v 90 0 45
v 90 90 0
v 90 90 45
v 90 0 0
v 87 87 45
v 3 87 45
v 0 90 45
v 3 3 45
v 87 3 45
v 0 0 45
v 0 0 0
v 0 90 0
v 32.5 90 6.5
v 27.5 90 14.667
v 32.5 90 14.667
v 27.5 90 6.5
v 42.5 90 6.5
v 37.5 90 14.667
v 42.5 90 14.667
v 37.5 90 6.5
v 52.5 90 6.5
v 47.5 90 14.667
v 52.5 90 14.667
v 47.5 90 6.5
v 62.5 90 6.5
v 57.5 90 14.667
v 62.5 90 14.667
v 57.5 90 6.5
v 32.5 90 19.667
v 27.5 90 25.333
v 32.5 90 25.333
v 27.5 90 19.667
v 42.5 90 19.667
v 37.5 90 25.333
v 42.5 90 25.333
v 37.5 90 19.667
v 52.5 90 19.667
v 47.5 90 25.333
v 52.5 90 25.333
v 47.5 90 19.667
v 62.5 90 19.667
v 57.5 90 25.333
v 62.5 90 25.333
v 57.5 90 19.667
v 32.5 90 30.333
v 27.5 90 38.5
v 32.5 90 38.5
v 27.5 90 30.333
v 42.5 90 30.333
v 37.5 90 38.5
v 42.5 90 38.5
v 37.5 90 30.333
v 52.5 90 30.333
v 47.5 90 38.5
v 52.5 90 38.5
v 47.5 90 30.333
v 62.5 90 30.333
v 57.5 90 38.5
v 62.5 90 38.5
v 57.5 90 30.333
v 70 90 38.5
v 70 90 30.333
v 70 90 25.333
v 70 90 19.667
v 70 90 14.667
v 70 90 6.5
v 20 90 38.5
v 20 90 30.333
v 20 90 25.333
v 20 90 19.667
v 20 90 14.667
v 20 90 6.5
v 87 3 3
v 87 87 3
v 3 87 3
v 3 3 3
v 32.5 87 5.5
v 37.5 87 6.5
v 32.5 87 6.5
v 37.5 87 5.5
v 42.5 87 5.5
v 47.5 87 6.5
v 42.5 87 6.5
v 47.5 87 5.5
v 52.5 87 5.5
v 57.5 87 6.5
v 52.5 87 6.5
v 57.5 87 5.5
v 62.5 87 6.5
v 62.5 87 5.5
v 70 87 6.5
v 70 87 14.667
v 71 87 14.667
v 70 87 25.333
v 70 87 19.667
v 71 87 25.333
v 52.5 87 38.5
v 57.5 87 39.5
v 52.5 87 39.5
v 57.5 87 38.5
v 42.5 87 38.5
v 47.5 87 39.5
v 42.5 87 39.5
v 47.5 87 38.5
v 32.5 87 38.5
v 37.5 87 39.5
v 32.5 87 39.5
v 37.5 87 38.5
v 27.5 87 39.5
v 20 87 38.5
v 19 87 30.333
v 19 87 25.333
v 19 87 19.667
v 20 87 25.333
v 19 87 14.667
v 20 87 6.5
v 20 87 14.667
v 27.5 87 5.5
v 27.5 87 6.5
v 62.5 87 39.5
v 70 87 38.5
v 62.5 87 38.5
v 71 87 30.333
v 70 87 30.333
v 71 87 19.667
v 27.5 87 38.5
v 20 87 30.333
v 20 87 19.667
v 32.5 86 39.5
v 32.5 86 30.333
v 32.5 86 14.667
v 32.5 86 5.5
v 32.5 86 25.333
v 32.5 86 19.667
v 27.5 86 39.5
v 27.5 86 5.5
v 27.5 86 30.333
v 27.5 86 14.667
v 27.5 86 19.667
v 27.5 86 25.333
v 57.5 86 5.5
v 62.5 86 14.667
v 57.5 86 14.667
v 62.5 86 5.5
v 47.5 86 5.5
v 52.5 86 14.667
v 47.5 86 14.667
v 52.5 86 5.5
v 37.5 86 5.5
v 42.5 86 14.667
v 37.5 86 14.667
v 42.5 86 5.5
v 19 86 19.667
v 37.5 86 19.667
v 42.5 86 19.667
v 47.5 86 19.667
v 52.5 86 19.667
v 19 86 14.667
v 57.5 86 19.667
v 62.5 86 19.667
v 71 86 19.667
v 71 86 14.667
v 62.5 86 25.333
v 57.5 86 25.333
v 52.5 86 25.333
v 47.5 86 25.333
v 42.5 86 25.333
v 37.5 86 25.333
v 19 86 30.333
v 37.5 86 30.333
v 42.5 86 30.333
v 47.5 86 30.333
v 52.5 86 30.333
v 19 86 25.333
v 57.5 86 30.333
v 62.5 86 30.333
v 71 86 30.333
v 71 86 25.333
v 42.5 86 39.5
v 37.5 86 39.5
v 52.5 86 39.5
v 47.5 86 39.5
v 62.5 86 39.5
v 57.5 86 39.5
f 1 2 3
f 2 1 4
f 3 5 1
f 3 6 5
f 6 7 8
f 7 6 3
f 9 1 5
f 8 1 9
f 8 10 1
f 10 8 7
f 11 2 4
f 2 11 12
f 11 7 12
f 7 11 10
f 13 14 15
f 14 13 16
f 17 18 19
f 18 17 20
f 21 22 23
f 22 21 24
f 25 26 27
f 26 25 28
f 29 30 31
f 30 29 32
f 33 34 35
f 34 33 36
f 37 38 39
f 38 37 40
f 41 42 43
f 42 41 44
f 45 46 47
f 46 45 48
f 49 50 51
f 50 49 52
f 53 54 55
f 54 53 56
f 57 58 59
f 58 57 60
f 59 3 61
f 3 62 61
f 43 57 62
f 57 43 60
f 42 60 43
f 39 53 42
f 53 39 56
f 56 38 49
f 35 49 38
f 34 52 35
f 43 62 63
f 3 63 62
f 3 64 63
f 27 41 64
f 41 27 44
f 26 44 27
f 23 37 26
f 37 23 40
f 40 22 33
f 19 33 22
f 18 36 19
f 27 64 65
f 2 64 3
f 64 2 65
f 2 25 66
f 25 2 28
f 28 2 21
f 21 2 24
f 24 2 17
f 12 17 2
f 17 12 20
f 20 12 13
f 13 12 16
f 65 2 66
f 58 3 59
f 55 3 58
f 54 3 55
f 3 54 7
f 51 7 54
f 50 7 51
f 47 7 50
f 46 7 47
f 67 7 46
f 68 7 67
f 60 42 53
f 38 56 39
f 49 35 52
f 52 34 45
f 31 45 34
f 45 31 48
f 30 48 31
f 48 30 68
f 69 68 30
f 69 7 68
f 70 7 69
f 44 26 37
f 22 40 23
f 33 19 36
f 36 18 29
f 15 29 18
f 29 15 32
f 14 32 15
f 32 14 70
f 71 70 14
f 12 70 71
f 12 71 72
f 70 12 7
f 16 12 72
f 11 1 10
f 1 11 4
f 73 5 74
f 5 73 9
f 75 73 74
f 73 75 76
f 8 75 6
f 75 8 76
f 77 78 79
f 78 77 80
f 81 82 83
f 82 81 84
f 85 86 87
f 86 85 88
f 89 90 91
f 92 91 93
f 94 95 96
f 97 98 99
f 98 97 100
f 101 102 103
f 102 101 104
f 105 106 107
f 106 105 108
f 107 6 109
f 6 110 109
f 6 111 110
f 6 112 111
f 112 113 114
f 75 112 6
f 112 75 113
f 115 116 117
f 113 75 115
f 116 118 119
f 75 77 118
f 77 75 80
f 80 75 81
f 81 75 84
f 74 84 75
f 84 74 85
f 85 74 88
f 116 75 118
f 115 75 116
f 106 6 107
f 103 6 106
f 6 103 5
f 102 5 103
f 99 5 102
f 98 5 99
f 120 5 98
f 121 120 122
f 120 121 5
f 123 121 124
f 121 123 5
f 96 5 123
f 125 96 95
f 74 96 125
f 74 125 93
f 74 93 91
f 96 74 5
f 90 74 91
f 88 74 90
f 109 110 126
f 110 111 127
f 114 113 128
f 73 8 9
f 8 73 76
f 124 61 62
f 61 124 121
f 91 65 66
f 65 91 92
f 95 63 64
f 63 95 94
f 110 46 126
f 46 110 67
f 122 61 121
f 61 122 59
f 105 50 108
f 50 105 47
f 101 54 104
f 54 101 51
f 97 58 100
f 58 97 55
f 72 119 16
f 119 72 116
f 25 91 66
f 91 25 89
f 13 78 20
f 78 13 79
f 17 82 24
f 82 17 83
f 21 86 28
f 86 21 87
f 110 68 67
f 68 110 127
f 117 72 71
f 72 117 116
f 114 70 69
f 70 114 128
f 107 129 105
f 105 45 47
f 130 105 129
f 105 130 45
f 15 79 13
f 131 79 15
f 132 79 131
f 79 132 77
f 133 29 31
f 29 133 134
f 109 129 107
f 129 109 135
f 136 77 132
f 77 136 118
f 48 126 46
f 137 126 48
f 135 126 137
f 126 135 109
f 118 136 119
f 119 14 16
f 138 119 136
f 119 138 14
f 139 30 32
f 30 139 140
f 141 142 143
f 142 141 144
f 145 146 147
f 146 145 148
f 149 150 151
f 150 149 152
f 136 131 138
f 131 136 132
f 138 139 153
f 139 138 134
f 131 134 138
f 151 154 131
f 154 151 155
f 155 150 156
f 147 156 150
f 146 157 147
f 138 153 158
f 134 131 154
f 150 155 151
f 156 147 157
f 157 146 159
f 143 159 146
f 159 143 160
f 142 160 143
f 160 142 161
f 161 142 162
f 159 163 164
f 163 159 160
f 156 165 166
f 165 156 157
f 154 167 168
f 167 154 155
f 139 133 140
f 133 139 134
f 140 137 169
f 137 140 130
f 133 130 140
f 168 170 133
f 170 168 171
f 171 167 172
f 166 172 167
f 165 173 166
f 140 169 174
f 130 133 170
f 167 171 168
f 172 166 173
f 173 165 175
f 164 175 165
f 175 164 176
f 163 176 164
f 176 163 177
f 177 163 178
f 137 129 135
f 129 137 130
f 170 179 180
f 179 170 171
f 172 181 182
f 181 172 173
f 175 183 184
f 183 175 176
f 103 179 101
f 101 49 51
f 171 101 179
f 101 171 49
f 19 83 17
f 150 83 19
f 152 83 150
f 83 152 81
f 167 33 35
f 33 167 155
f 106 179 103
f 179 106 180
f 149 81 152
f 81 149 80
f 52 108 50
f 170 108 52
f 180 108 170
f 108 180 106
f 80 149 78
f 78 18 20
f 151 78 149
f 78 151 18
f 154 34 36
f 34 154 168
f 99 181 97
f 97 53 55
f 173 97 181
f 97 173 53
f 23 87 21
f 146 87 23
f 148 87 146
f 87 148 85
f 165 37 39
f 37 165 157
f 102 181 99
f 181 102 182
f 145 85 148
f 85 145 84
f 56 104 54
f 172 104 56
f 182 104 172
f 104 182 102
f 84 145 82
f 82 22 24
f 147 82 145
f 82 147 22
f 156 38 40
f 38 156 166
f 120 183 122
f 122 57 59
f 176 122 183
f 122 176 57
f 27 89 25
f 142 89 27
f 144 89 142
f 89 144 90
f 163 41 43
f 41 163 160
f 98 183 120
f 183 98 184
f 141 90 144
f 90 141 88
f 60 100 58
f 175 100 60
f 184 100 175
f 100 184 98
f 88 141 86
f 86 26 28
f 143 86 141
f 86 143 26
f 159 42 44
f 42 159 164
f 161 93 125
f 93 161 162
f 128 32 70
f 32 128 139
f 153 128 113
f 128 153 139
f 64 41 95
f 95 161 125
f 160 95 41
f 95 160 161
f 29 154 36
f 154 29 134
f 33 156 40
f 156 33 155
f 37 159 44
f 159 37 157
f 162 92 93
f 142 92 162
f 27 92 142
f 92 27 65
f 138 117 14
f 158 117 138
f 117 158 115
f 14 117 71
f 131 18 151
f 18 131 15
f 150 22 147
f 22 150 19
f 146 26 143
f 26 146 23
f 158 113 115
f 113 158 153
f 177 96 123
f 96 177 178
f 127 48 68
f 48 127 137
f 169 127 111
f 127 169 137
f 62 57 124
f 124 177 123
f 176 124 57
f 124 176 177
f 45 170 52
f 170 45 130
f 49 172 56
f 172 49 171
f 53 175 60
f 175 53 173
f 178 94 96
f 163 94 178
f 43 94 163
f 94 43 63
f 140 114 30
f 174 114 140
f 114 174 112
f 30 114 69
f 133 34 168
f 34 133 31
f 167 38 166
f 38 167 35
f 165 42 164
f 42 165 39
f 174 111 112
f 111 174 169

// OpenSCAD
$fn = 32;

// ----------------------------------------------------------------------
// Vent box: crossgrid enclosure
// ----------------------------------------------------------------------

// --- parameters (mm) ---
box_l = 90;               // box length, X
box_w = 90;               // box width, Y
box_h = 45;               // box height, Z
wall_t = 3;               // shell wall thickness
win_l = 50;               // vent window width, X
win_h = 32;               // vent window height, Z
bar_w = 5;                // grid bar width
n_v = 4;                  // vertical bar count
n_h = 2;                  // horizontal bar count

win_z0 = (box_h - win_h) / 2;  // window lower edge Z
v_step = win_l / (n_v + 1);  // vertical bar step
h_step = win_h / (n_h + 1);  // horizontal bar step

difference() {
  union() {
    difference() {
      cube([box_l, box_w, box_h]);
  translate([wall_t, wall_t, wall_t])
    cube([box_l - 2 * wall_t, box_w - 2 * wall_t, box_h]);
  translate([(box_l - win_l) / 2, box_w - wall_t - 1, win_z0])
    cube([win_l, wall_t + 2, win_h]);
    }
    for (i = [1 : n_v])
      translate([(box_l - win_l) / 2 + i * v_step - bar_w / 2,
                 box_w - wall_t - 1, win_z0 - 1])
        cube([bar_w, wall_t + 1, win_h + 2]);
    for (i = [1 : n_h])
      translate([(box_l - win_l) / 2 - 1, box_w - wall_t - 1,
                 win_z0 + i * h_step - bar_w / 2])
        cube([win_l + 2, wall_t + 1, bar_w]);
  }
}
